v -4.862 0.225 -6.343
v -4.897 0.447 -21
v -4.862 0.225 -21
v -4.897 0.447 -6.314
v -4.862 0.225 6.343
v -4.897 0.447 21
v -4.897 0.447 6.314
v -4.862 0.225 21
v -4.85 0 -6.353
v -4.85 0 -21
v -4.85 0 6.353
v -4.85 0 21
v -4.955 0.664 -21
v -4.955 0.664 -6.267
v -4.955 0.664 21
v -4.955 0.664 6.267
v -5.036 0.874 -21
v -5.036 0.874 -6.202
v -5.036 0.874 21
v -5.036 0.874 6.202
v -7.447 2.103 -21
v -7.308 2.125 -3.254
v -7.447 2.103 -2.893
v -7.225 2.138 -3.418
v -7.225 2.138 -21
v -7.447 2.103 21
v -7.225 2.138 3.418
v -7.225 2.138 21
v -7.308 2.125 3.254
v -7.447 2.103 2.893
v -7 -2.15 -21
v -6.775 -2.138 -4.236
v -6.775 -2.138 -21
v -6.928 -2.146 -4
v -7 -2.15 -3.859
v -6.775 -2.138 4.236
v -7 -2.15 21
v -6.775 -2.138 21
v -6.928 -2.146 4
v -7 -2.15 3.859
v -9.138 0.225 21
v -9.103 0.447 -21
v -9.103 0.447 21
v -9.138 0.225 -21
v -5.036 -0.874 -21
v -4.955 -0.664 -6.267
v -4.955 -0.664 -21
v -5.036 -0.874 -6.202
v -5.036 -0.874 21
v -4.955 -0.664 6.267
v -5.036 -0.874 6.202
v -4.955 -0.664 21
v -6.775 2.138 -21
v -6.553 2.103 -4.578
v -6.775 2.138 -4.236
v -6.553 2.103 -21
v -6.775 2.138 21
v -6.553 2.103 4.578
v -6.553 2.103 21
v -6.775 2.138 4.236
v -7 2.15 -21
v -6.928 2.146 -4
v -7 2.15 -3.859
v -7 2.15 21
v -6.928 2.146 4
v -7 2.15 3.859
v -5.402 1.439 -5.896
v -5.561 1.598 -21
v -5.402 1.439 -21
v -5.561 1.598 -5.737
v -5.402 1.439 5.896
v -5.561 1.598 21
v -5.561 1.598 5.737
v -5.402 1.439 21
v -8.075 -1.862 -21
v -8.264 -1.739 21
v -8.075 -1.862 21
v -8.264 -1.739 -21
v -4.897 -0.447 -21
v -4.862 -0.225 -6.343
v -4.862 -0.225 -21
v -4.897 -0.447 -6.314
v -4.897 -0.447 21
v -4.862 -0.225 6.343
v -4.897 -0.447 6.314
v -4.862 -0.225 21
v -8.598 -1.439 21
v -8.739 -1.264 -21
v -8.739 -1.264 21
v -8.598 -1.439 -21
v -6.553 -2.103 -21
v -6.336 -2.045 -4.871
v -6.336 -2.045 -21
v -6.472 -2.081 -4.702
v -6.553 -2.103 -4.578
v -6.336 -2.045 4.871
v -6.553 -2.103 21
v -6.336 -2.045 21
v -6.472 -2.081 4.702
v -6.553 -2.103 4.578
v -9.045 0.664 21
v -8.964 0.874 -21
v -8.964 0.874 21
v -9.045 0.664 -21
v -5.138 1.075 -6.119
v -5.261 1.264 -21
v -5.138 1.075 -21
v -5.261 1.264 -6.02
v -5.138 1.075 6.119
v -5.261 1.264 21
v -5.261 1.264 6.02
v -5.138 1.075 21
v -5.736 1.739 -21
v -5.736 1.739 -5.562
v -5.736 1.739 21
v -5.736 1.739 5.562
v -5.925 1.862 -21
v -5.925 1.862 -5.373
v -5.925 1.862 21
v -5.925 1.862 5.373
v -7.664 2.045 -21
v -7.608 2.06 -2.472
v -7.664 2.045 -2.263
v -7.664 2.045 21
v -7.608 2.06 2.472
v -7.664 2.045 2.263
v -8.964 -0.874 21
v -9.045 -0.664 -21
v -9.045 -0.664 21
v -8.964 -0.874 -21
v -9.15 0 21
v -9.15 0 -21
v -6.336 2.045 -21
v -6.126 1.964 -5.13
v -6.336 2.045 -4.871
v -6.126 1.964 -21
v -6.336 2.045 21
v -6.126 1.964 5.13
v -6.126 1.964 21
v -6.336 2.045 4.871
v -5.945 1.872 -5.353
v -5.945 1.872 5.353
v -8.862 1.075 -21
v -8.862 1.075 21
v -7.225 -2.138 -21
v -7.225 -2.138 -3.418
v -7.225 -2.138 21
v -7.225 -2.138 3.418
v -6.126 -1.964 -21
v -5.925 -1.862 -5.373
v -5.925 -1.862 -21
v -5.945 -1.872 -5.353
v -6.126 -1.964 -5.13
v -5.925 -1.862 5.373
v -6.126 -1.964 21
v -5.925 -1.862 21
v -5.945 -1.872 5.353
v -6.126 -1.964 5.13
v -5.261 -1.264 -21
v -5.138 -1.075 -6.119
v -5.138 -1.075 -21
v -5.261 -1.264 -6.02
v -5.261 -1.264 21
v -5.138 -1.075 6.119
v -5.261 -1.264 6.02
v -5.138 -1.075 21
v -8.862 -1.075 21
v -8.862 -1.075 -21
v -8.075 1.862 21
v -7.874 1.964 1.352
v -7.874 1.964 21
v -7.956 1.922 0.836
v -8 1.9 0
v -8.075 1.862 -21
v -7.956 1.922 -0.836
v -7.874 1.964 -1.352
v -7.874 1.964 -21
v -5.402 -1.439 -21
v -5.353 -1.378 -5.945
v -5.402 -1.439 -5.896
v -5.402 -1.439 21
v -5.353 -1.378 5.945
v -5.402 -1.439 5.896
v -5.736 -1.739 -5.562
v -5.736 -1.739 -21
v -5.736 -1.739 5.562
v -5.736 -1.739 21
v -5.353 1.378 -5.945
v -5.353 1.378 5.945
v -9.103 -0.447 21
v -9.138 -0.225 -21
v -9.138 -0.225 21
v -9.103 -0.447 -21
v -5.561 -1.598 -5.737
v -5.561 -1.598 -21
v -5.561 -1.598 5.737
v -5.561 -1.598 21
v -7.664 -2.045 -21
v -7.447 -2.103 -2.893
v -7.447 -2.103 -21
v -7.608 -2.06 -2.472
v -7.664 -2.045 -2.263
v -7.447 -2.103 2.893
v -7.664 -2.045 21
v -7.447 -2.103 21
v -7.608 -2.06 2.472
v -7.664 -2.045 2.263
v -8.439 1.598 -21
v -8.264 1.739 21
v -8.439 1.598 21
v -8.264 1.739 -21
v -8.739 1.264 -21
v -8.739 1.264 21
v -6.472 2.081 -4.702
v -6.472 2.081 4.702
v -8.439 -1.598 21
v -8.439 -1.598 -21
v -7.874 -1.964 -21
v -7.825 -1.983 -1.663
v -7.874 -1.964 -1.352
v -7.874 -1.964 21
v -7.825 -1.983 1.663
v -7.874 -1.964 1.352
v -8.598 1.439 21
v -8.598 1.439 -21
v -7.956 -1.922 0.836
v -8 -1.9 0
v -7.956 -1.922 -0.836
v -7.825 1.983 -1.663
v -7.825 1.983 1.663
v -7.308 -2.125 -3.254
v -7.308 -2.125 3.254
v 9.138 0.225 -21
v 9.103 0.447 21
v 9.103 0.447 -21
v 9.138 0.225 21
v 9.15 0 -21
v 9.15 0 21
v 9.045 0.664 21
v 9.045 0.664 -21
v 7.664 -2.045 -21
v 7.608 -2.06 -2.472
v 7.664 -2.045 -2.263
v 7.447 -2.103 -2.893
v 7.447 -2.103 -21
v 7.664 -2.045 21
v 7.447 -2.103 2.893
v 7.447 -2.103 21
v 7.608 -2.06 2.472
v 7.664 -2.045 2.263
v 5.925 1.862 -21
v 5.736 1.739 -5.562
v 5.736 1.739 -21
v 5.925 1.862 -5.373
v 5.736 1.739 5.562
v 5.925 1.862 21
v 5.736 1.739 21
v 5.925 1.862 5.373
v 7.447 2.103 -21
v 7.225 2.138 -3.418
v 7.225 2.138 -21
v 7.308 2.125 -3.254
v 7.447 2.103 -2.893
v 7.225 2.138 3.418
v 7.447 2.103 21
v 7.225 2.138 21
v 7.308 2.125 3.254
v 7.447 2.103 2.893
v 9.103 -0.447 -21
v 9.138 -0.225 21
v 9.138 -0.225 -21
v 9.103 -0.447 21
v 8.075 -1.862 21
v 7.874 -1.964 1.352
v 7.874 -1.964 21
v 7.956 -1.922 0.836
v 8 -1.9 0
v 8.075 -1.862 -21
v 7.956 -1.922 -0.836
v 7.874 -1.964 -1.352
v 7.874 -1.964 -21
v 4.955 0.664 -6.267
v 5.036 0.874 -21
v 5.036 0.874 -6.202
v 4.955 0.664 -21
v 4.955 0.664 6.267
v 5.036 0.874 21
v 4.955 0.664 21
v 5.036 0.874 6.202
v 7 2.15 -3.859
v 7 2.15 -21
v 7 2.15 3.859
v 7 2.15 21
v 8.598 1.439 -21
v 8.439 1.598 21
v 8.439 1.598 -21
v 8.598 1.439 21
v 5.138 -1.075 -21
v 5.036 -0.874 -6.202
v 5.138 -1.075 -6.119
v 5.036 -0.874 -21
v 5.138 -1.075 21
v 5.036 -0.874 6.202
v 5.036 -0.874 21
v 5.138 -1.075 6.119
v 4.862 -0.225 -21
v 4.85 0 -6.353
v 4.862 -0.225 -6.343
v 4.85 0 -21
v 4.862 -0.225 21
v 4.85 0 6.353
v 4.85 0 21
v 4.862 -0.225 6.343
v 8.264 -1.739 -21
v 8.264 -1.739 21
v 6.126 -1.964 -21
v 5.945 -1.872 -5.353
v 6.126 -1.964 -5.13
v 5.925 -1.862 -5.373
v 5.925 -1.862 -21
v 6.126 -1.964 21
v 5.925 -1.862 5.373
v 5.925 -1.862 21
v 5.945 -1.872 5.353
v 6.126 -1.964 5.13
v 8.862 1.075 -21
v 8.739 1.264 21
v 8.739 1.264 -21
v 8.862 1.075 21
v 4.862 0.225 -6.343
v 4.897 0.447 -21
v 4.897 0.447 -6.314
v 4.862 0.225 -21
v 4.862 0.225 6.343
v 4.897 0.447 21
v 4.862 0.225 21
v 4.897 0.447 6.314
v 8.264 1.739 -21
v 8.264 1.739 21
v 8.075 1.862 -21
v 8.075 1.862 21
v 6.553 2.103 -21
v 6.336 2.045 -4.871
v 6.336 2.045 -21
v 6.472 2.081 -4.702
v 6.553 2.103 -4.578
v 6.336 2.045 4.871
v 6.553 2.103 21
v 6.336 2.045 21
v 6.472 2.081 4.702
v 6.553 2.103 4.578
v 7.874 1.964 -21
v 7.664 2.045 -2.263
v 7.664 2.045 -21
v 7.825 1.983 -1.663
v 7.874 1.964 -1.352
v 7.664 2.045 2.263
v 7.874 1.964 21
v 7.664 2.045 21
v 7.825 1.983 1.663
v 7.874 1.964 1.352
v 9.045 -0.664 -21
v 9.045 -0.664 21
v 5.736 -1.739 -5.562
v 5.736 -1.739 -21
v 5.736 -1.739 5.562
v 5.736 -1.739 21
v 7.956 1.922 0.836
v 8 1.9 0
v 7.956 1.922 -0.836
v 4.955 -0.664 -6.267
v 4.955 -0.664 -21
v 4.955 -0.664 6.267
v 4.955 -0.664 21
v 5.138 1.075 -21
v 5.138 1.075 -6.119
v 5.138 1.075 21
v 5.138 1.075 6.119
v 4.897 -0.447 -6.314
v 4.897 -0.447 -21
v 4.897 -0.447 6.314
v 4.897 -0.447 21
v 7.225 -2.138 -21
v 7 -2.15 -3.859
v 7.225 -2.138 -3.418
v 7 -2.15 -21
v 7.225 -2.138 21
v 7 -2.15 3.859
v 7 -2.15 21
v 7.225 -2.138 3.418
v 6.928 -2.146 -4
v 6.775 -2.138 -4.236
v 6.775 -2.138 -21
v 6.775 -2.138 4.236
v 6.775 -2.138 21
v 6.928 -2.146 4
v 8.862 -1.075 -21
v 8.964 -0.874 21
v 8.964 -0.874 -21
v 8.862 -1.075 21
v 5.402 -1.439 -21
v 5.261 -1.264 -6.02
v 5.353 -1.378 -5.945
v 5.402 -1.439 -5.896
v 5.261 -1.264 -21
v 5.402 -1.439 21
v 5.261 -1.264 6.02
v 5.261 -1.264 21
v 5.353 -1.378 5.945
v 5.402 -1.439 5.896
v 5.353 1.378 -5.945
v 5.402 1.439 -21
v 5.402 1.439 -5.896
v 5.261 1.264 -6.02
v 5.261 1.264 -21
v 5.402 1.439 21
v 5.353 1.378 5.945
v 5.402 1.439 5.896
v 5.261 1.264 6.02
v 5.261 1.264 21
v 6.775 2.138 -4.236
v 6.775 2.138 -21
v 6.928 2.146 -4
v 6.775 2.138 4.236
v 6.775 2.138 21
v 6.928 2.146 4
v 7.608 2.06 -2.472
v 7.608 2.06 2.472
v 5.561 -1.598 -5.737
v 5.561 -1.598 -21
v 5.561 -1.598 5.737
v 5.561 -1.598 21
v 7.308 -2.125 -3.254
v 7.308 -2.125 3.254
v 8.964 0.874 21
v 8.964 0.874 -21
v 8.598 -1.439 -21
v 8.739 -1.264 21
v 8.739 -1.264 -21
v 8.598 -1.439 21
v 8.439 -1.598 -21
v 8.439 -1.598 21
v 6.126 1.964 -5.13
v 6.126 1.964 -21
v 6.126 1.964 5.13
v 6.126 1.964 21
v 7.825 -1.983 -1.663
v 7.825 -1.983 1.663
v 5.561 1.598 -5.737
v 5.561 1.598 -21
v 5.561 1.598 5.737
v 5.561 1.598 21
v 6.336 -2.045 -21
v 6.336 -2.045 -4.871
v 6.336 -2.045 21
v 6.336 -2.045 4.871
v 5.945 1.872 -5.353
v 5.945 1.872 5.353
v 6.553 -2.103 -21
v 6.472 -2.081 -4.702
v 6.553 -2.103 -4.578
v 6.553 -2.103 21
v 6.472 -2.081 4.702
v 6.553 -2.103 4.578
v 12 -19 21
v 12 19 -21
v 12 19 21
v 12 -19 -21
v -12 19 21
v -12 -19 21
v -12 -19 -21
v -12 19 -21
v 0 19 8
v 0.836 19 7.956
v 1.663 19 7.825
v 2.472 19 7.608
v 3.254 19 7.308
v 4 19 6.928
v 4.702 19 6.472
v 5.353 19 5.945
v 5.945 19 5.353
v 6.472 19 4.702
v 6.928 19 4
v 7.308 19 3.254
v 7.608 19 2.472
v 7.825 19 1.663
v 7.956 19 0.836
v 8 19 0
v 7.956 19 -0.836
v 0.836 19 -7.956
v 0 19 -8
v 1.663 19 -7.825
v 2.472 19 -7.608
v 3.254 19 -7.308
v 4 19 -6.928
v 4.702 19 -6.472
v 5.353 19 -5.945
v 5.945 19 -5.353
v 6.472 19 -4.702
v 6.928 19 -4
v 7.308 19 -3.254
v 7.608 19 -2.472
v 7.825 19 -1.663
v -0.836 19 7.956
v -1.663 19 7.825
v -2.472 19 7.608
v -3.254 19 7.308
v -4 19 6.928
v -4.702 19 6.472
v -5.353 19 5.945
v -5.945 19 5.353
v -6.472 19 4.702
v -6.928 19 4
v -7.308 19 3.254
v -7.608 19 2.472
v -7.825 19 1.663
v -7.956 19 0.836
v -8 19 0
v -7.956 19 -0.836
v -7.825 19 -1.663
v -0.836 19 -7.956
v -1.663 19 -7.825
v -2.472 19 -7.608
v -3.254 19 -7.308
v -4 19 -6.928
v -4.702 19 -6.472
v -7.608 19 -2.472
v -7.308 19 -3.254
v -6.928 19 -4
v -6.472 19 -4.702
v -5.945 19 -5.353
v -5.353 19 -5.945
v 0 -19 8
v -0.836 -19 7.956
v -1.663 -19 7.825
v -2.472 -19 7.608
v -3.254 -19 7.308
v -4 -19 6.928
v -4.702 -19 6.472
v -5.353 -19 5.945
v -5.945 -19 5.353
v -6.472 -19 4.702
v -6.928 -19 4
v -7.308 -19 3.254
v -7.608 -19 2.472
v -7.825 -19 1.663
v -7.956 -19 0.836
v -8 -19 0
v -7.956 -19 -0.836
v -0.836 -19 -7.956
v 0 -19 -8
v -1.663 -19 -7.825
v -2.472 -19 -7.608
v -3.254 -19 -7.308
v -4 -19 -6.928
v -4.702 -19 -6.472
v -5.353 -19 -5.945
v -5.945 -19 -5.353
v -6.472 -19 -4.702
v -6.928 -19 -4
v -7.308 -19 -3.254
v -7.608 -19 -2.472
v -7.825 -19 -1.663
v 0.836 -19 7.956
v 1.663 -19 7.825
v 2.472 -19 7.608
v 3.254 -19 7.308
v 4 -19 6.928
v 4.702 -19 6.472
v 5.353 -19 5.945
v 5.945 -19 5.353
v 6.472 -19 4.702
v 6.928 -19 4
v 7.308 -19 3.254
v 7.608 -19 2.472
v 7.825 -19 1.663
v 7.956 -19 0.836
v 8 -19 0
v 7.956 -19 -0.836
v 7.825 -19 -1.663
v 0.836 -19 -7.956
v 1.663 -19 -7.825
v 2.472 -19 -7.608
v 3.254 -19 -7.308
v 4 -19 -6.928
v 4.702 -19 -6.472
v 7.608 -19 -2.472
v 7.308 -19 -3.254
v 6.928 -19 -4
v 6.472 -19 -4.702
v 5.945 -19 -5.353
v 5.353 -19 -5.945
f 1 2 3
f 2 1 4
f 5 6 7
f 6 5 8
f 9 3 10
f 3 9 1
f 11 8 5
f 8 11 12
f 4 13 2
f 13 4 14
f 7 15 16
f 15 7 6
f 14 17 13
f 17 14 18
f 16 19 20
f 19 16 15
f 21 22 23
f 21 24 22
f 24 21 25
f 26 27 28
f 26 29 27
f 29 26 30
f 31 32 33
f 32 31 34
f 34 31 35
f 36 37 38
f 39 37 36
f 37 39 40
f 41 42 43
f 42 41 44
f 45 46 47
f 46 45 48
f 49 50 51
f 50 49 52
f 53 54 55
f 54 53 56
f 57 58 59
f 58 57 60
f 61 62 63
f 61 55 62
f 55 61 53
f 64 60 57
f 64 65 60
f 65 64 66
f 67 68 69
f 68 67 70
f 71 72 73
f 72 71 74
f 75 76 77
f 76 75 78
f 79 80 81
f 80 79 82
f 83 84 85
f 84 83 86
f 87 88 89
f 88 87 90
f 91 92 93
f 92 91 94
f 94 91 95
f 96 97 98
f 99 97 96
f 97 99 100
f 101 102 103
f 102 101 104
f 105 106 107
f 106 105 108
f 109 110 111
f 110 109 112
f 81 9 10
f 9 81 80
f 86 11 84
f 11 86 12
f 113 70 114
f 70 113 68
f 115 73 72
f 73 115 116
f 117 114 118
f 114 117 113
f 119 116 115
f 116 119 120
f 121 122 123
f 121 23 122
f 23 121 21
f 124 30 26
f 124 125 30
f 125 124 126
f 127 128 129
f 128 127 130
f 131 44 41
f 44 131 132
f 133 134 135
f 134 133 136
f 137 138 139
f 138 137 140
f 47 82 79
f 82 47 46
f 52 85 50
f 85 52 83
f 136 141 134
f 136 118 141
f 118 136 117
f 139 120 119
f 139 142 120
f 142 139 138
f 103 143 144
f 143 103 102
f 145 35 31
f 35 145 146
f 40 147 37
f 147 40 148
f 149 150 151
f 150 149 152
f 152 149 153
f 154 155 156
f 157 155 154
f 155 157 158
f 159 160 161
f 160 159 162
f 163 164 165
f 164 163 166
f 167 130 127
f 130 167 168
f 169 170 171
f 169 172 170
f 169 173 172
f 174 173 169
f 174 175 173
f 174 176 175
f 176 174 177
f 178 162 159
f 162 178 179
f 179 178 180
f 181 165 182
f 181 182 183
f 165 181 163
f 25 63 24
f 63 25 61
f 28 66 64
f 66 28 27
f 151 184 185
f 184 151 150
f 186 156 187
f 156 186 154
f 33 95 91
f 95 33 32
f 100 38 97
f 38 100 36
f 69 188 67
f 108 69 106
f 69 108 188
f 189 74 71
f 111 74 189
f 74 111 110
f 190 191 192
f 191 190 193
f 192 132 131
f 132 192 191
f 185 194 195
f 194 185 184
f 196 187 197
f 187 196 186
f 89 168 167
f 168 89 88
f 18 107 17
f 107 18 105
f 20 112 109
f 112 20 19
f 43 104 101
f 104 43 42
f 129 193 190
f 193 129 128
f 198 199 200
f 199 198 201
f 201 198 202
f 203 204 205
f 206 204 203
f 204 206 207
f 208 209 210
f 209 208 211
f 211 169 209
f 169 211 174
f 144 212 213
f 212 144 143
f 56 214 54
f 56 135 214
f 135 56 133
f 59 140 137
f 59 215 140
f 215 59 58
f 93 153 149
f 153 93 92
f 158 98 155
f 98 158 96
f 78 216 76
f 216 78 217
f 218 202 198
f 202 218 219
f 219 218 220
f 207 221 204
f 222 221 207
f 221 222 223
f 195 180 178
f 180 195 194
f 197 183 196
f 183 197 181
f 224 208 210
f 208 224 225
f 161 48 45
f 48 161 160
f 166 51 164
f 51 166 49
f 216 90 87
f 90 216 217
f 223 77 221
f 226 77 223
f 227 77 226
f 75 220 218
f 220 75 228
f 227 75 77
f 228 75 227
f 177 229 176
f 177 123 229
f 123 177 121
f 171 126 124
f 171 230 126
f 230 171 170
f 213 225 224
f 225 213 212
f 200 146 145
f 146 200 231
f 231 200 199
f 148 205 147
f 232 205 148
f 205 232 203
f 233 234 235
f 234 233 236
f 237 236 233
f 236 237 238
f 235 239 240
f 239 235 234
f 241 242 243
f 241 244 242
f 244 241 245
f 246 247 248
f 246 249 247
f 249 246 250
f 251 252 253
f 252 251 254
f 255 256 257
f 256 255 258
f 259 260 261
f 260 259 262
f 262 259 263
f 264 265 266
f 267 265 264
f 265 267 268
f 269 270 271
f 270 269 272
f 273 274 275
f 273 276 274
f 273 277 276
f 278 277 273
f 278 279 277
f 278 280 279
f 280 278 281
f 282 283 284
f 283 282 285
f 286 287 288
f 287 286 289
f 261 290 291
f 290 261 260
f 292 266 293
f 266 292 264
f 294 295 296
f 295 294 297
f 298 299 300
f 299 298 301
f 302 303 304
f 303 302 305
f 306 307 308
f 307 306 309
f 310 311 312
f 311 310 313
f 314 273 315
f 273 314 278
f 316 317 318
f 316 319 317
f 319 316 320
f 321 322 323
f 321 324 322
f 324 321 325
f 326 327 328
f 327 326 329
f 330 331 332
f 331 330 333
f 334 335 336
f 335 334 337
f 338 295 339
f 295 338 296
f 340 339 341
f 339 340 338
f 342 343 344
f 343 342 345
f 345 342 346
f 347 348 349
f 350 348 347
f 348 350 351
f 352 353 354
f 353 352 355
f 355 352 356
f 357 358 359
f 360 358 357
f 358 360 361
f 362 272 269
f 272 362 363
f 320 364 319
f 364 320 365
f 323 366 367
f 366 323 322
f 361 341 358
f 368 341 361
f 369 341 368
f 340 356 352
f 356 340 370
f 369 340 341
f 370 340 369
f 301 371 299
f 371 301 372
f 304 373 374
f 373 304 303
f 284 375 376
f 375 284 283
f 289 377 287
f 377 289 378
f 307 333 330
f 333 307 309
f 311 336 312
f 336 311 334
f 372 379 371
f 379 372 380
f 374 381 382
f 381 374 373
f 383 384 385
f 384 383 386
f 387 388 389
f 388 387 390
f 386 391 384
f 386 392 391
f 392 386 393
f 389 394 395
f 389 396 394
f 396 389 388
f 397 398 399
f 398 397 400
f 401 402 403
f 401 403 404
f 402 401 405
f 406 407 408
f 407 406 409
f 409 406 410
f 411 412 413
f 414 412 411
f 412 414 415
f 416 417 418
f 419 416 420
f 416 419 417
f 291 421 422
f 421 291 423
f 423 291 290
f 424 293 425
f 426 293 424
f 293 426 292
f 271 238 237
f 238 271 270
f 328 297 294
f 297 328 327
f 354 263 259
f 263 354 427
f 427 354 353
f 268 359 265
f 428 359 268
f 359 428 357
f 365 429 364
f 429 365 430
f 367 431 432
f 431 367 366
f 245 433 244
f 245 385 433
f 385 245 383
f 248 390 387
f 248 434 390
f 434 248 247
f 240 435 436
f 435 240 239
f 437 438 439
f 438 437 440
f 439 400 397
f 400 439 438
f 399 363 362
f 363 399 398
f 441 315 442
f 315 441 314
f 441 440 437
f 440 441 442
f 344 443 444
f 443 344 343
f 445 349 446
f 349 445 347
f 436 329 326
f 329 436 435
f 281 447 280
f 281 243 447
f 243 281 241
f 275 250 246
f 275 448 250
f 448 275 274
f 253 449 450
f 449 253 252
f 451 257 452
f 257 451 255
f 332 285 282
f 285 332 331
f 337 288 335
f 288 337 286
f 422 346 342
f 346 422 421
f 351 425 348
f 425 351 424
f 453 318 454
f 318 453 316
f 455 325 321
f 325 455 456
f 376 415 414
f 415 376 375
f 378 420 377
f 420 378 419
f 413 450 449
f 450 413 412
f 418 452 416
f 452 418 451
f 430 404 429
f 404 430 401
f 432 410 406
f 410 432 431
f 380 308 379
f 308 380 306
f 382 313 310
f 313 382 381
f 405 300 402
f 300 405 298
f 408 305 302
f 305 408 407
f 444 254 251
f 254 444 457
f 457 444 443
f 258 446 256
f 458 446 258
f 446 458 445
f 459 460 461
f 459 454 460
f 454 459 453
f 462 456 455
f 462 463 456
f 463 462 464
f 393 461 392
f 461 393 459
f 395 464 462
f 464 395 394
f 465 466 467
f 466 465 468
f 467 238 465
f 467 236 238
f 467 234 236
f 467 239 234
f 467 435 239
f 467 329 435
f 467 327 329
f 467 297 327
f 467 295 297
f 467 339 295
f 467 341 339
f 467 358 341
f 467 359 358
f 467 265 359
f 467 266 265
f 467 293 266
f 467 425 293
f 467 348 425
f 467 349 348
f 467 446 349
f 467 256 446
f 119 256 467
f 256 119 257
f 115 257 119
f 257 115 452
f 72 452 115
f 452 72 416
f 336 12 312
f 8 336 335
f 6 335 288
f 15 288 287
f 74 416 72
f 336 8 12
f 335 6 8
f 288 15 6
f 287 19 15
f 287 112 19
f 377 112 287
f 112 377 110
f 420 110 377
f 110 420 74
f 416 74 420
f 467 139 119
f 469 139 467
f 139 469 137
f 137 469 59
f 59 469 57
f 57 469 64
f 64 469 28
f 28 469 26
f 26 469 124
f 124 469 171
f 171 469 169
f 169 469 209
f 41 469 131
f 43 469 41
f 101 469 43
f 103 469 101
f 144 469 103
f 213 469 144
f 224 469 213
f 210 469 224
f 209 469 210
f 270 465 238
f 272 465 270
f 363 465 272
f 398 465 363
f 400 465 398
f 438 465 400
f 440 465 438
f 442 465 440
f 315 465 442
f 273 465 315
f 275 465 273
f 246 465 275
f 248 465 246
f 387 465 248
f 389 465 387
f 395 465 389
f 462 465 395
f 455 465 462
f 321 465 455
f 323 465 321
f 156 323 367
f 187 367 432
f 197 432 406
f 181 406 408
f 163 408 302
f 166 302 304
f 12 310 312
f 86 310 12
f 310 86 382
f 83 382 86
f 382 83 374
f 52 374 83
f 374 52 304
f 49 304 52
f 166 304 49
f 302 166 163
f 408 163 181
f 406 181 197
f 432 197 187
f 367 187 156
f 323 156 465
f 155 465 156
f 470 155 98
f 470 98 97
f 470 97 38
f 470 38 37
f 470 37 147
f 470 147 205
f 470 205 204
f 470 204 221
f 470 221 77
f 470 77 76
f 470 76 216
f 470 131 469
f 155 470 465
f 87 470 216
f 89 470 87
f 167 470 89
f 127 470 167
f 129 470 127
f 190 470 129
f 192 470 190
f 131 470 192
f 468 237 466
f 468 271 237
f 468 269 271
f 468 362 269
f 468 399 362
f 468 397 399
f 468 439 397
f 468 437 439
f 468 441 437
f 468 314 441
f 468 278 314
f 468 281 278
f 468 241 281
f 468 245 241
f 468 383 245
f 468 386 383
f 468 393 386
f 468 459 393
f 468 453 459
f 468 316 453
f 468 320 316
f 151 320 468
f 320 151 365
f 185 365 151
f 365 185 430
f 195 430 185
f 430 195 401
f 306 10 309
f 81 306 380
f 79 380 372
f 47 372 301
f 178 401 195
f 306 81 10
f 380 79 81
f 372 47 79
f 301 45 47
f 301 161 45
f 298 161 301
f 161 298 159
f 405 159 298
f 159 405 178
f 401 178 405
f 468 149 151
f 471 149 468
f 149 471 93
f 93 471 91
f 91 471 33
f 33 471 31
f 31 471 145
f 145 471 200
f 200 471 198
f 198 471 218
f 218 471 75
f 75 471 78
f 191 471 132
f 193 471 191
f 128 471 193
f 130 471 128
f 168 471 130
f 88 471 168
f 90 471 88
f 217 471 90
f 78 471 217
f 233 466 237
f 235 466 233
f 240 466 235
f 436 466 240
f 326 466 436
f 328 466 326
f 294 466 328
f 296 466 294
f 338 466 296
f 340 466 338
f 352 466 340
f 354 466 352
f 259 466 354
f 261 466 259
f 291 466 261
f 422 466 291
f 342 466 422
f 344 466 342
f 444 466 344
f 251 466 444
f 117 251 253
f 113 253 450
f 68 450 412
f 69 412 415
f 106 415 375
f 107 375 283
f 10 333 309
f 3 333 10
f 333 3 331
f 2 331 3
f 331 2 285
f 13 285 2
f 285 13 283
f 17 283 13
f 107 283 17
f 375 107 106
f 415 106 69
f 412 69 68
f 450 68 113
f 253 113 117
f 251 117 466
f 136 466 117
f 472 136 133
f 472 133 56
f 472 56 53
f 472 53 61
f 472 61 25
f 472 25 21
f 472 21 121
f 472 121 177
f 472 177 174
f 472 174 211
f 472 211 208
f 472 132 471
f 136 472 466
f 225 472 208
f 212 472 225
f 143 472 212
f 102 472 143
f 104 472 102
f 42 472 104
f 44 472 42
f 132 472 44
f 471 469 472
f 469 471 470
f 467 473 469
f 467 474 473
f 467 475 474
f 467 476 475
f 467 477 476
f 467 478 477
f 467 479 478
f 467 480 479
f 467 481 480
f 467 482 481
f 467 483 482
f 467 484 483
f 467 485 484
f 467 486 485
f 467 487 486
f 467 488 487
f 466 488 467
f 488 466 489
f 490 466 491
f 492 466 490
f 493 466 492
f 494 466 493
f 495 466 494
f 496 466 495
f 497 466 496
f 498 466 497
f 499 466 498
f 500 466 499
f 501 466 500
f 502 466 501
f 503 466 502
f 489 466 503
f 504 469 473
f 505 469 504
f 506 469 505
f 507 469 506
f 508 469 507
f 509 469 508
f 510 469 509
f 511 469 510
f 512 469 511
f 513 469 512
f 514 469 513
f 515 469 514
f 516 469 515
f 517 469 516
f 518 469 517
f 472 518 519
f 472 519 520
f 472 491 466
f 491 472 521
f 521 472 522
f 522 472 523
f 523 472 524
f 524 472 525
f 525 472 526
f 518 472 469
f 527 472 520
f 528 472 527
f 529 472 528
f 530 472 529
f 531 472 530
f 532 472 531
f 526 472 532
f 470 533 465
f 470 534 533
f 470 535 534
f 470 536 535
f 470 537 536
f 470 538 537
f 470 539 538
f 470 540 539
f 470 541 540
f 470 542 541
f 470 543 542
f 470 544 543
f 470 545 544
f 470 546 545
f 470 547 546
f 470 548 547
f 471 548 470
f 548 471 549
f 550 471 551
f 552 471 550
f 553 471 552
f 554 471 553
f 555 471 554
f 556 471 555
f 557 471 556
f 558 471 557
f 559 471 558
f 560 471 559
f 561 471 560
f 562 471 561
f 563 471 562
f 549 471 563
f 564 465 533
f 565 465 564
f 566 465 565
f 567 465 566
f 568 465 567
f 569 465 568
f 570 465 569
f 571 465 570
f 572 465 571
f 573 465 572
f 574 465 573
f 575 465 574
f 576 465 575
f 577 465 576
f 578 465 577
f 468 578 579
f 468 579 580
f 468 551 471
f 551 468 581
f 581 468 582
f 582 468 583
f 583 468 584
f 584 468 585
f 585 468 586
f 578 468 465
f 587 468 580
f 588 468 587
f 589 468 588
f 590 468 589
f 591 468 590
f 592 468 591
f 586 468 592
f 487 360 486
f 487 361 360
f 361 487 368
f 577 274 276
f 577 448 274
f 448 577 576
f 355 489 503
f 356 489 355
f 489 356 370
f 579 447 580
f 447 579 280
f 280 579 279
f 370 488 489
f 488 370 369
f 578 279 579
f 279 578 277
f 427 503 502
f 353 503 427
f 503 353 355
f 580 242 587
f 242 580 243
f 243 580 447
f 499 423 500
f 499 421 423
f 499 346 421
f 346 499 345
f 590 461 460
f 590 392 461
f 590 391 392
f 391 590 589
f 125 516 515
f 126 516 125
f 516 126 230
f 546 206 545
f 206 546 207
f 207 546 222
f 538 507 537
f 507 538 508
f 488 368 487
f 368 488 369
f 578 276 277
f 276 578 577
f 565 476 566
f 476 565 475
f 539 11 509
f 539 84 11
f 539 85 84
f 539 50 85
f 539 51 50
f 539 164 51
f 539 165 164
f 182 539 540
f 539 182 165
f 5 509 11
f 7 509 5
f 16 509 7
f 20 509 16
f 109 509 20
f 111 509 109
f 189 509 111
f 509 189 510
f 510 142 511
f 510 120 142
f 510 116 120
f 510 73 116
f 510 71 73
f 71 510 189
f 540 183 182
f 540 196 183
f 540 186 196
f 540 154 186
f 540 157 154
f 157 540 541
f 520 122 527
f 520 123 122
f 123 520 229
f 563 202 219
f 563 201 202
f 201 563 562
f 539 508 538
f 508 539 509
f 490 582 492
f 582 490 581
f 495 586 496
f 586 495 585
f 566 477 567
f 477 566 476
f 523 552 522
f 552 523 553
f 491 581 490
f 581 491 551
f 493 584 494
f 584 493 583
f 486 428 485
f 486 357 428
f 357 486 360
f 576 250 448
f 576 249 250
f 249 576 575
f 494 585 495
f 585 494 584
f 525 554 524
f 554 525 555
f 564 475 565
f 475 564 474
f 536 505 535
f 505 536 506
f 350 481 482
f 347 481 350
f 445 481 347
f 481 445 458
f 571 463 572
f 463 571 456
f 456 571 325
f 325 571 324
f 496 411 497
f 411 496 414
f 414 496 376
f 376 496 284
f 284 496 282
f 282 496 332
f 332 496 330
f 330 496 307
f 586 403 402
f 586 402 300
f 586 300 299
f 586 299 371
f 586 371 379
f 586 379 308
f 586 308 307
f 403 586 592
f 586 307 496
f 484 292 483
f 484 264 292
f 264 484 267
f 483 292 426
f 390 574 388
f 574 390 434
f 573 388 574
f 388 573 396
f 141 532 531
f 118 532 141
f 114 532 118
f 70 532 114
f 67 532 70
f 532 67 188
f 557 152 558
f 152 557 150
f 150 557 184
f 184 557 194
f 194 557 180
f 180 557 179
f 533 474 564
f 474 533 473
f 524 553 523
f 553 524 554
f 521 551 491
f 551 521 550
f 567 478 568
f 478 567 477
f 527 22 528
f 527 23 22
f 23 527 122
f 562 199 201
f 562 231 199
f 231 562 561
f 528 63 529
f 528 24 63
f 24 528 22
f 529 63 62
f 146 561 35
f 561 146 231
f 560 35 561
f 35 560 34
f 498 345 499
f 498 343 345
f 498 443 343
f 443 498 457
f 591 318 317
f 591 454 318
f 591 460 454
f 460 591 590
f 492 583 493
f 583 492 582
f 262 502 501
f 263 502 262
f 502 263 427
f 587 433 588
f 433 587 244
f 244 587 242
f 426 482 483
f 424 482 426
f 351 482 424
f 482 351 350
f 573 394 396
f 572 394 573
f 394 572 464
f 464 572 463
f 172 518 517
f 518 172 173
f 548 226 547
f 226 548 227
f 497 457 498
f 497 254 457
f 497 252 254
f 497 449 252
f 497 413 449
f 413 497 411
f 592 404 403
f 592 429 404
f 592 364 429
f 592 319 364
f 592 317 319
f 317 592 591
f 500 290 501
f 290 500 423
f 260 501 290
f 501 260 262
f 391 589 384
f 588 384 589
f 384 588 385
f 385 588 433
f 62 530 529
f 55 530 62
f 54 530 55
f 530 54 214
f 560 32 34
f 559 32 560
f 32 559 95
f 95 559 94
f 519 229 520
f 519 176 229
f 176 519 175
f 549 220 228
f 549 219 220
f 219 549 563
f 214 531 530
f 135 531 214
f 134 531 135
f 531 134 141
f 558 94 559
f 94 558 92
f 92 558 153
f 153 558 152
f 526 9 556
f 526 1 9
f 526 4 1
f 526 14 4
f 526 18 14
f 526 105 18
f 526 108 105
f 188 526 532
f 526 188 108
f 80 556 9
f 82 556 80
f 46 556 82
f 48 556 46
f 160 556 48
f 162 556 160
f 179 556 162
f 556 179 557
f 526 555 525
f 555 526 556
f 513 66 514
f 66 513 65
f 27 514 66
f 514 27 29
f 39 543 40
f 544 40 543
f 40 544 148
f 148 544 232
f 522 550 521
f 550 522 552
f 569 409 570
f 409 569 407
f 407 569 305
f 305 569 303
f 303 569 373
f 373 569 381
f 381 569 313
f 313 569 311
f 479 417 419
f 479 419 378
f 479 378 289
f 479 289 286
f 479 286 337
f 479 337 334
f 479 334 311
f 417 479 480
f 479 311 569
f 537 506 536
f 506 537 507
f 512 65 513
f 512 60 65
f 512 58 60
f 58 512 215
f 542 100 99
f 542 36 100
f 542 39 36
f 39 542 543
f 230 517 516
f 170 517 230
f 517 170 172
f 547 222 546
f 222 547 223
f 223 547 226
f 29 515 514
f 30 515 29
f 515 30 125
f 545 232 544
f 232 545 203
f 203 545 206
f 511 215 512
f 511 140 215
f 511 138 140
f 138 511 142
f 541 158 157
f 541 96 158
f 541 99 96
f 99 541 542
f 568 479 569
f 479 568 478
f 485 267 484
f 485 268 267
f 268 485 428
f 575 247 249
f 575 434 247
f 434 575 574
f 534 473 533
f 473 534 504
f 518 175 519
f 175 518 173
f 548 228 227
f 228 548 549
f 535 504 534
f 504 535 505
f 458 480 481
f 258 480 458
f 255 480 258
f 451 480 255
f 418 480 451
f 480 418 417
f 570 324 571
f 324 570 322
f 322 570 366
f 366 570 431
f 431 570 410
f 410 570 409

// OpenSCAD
// Linear rail stop block.
$fn = 60;
eps = 0.02;
width = 38;
height = 42;
bore_d = 16;
length = 24;
difference() {
    cube([length,width,height],center=true);
    translate([0,-width/2-eps,0]) rotate([-90,0,0]) cylinder(d=bore_d,h=width+2*eps);
    for(x=[-7,7]) translate([x,0,-height/2-eps]) cylinder(d=4.3,h=height+2*eps);
}
